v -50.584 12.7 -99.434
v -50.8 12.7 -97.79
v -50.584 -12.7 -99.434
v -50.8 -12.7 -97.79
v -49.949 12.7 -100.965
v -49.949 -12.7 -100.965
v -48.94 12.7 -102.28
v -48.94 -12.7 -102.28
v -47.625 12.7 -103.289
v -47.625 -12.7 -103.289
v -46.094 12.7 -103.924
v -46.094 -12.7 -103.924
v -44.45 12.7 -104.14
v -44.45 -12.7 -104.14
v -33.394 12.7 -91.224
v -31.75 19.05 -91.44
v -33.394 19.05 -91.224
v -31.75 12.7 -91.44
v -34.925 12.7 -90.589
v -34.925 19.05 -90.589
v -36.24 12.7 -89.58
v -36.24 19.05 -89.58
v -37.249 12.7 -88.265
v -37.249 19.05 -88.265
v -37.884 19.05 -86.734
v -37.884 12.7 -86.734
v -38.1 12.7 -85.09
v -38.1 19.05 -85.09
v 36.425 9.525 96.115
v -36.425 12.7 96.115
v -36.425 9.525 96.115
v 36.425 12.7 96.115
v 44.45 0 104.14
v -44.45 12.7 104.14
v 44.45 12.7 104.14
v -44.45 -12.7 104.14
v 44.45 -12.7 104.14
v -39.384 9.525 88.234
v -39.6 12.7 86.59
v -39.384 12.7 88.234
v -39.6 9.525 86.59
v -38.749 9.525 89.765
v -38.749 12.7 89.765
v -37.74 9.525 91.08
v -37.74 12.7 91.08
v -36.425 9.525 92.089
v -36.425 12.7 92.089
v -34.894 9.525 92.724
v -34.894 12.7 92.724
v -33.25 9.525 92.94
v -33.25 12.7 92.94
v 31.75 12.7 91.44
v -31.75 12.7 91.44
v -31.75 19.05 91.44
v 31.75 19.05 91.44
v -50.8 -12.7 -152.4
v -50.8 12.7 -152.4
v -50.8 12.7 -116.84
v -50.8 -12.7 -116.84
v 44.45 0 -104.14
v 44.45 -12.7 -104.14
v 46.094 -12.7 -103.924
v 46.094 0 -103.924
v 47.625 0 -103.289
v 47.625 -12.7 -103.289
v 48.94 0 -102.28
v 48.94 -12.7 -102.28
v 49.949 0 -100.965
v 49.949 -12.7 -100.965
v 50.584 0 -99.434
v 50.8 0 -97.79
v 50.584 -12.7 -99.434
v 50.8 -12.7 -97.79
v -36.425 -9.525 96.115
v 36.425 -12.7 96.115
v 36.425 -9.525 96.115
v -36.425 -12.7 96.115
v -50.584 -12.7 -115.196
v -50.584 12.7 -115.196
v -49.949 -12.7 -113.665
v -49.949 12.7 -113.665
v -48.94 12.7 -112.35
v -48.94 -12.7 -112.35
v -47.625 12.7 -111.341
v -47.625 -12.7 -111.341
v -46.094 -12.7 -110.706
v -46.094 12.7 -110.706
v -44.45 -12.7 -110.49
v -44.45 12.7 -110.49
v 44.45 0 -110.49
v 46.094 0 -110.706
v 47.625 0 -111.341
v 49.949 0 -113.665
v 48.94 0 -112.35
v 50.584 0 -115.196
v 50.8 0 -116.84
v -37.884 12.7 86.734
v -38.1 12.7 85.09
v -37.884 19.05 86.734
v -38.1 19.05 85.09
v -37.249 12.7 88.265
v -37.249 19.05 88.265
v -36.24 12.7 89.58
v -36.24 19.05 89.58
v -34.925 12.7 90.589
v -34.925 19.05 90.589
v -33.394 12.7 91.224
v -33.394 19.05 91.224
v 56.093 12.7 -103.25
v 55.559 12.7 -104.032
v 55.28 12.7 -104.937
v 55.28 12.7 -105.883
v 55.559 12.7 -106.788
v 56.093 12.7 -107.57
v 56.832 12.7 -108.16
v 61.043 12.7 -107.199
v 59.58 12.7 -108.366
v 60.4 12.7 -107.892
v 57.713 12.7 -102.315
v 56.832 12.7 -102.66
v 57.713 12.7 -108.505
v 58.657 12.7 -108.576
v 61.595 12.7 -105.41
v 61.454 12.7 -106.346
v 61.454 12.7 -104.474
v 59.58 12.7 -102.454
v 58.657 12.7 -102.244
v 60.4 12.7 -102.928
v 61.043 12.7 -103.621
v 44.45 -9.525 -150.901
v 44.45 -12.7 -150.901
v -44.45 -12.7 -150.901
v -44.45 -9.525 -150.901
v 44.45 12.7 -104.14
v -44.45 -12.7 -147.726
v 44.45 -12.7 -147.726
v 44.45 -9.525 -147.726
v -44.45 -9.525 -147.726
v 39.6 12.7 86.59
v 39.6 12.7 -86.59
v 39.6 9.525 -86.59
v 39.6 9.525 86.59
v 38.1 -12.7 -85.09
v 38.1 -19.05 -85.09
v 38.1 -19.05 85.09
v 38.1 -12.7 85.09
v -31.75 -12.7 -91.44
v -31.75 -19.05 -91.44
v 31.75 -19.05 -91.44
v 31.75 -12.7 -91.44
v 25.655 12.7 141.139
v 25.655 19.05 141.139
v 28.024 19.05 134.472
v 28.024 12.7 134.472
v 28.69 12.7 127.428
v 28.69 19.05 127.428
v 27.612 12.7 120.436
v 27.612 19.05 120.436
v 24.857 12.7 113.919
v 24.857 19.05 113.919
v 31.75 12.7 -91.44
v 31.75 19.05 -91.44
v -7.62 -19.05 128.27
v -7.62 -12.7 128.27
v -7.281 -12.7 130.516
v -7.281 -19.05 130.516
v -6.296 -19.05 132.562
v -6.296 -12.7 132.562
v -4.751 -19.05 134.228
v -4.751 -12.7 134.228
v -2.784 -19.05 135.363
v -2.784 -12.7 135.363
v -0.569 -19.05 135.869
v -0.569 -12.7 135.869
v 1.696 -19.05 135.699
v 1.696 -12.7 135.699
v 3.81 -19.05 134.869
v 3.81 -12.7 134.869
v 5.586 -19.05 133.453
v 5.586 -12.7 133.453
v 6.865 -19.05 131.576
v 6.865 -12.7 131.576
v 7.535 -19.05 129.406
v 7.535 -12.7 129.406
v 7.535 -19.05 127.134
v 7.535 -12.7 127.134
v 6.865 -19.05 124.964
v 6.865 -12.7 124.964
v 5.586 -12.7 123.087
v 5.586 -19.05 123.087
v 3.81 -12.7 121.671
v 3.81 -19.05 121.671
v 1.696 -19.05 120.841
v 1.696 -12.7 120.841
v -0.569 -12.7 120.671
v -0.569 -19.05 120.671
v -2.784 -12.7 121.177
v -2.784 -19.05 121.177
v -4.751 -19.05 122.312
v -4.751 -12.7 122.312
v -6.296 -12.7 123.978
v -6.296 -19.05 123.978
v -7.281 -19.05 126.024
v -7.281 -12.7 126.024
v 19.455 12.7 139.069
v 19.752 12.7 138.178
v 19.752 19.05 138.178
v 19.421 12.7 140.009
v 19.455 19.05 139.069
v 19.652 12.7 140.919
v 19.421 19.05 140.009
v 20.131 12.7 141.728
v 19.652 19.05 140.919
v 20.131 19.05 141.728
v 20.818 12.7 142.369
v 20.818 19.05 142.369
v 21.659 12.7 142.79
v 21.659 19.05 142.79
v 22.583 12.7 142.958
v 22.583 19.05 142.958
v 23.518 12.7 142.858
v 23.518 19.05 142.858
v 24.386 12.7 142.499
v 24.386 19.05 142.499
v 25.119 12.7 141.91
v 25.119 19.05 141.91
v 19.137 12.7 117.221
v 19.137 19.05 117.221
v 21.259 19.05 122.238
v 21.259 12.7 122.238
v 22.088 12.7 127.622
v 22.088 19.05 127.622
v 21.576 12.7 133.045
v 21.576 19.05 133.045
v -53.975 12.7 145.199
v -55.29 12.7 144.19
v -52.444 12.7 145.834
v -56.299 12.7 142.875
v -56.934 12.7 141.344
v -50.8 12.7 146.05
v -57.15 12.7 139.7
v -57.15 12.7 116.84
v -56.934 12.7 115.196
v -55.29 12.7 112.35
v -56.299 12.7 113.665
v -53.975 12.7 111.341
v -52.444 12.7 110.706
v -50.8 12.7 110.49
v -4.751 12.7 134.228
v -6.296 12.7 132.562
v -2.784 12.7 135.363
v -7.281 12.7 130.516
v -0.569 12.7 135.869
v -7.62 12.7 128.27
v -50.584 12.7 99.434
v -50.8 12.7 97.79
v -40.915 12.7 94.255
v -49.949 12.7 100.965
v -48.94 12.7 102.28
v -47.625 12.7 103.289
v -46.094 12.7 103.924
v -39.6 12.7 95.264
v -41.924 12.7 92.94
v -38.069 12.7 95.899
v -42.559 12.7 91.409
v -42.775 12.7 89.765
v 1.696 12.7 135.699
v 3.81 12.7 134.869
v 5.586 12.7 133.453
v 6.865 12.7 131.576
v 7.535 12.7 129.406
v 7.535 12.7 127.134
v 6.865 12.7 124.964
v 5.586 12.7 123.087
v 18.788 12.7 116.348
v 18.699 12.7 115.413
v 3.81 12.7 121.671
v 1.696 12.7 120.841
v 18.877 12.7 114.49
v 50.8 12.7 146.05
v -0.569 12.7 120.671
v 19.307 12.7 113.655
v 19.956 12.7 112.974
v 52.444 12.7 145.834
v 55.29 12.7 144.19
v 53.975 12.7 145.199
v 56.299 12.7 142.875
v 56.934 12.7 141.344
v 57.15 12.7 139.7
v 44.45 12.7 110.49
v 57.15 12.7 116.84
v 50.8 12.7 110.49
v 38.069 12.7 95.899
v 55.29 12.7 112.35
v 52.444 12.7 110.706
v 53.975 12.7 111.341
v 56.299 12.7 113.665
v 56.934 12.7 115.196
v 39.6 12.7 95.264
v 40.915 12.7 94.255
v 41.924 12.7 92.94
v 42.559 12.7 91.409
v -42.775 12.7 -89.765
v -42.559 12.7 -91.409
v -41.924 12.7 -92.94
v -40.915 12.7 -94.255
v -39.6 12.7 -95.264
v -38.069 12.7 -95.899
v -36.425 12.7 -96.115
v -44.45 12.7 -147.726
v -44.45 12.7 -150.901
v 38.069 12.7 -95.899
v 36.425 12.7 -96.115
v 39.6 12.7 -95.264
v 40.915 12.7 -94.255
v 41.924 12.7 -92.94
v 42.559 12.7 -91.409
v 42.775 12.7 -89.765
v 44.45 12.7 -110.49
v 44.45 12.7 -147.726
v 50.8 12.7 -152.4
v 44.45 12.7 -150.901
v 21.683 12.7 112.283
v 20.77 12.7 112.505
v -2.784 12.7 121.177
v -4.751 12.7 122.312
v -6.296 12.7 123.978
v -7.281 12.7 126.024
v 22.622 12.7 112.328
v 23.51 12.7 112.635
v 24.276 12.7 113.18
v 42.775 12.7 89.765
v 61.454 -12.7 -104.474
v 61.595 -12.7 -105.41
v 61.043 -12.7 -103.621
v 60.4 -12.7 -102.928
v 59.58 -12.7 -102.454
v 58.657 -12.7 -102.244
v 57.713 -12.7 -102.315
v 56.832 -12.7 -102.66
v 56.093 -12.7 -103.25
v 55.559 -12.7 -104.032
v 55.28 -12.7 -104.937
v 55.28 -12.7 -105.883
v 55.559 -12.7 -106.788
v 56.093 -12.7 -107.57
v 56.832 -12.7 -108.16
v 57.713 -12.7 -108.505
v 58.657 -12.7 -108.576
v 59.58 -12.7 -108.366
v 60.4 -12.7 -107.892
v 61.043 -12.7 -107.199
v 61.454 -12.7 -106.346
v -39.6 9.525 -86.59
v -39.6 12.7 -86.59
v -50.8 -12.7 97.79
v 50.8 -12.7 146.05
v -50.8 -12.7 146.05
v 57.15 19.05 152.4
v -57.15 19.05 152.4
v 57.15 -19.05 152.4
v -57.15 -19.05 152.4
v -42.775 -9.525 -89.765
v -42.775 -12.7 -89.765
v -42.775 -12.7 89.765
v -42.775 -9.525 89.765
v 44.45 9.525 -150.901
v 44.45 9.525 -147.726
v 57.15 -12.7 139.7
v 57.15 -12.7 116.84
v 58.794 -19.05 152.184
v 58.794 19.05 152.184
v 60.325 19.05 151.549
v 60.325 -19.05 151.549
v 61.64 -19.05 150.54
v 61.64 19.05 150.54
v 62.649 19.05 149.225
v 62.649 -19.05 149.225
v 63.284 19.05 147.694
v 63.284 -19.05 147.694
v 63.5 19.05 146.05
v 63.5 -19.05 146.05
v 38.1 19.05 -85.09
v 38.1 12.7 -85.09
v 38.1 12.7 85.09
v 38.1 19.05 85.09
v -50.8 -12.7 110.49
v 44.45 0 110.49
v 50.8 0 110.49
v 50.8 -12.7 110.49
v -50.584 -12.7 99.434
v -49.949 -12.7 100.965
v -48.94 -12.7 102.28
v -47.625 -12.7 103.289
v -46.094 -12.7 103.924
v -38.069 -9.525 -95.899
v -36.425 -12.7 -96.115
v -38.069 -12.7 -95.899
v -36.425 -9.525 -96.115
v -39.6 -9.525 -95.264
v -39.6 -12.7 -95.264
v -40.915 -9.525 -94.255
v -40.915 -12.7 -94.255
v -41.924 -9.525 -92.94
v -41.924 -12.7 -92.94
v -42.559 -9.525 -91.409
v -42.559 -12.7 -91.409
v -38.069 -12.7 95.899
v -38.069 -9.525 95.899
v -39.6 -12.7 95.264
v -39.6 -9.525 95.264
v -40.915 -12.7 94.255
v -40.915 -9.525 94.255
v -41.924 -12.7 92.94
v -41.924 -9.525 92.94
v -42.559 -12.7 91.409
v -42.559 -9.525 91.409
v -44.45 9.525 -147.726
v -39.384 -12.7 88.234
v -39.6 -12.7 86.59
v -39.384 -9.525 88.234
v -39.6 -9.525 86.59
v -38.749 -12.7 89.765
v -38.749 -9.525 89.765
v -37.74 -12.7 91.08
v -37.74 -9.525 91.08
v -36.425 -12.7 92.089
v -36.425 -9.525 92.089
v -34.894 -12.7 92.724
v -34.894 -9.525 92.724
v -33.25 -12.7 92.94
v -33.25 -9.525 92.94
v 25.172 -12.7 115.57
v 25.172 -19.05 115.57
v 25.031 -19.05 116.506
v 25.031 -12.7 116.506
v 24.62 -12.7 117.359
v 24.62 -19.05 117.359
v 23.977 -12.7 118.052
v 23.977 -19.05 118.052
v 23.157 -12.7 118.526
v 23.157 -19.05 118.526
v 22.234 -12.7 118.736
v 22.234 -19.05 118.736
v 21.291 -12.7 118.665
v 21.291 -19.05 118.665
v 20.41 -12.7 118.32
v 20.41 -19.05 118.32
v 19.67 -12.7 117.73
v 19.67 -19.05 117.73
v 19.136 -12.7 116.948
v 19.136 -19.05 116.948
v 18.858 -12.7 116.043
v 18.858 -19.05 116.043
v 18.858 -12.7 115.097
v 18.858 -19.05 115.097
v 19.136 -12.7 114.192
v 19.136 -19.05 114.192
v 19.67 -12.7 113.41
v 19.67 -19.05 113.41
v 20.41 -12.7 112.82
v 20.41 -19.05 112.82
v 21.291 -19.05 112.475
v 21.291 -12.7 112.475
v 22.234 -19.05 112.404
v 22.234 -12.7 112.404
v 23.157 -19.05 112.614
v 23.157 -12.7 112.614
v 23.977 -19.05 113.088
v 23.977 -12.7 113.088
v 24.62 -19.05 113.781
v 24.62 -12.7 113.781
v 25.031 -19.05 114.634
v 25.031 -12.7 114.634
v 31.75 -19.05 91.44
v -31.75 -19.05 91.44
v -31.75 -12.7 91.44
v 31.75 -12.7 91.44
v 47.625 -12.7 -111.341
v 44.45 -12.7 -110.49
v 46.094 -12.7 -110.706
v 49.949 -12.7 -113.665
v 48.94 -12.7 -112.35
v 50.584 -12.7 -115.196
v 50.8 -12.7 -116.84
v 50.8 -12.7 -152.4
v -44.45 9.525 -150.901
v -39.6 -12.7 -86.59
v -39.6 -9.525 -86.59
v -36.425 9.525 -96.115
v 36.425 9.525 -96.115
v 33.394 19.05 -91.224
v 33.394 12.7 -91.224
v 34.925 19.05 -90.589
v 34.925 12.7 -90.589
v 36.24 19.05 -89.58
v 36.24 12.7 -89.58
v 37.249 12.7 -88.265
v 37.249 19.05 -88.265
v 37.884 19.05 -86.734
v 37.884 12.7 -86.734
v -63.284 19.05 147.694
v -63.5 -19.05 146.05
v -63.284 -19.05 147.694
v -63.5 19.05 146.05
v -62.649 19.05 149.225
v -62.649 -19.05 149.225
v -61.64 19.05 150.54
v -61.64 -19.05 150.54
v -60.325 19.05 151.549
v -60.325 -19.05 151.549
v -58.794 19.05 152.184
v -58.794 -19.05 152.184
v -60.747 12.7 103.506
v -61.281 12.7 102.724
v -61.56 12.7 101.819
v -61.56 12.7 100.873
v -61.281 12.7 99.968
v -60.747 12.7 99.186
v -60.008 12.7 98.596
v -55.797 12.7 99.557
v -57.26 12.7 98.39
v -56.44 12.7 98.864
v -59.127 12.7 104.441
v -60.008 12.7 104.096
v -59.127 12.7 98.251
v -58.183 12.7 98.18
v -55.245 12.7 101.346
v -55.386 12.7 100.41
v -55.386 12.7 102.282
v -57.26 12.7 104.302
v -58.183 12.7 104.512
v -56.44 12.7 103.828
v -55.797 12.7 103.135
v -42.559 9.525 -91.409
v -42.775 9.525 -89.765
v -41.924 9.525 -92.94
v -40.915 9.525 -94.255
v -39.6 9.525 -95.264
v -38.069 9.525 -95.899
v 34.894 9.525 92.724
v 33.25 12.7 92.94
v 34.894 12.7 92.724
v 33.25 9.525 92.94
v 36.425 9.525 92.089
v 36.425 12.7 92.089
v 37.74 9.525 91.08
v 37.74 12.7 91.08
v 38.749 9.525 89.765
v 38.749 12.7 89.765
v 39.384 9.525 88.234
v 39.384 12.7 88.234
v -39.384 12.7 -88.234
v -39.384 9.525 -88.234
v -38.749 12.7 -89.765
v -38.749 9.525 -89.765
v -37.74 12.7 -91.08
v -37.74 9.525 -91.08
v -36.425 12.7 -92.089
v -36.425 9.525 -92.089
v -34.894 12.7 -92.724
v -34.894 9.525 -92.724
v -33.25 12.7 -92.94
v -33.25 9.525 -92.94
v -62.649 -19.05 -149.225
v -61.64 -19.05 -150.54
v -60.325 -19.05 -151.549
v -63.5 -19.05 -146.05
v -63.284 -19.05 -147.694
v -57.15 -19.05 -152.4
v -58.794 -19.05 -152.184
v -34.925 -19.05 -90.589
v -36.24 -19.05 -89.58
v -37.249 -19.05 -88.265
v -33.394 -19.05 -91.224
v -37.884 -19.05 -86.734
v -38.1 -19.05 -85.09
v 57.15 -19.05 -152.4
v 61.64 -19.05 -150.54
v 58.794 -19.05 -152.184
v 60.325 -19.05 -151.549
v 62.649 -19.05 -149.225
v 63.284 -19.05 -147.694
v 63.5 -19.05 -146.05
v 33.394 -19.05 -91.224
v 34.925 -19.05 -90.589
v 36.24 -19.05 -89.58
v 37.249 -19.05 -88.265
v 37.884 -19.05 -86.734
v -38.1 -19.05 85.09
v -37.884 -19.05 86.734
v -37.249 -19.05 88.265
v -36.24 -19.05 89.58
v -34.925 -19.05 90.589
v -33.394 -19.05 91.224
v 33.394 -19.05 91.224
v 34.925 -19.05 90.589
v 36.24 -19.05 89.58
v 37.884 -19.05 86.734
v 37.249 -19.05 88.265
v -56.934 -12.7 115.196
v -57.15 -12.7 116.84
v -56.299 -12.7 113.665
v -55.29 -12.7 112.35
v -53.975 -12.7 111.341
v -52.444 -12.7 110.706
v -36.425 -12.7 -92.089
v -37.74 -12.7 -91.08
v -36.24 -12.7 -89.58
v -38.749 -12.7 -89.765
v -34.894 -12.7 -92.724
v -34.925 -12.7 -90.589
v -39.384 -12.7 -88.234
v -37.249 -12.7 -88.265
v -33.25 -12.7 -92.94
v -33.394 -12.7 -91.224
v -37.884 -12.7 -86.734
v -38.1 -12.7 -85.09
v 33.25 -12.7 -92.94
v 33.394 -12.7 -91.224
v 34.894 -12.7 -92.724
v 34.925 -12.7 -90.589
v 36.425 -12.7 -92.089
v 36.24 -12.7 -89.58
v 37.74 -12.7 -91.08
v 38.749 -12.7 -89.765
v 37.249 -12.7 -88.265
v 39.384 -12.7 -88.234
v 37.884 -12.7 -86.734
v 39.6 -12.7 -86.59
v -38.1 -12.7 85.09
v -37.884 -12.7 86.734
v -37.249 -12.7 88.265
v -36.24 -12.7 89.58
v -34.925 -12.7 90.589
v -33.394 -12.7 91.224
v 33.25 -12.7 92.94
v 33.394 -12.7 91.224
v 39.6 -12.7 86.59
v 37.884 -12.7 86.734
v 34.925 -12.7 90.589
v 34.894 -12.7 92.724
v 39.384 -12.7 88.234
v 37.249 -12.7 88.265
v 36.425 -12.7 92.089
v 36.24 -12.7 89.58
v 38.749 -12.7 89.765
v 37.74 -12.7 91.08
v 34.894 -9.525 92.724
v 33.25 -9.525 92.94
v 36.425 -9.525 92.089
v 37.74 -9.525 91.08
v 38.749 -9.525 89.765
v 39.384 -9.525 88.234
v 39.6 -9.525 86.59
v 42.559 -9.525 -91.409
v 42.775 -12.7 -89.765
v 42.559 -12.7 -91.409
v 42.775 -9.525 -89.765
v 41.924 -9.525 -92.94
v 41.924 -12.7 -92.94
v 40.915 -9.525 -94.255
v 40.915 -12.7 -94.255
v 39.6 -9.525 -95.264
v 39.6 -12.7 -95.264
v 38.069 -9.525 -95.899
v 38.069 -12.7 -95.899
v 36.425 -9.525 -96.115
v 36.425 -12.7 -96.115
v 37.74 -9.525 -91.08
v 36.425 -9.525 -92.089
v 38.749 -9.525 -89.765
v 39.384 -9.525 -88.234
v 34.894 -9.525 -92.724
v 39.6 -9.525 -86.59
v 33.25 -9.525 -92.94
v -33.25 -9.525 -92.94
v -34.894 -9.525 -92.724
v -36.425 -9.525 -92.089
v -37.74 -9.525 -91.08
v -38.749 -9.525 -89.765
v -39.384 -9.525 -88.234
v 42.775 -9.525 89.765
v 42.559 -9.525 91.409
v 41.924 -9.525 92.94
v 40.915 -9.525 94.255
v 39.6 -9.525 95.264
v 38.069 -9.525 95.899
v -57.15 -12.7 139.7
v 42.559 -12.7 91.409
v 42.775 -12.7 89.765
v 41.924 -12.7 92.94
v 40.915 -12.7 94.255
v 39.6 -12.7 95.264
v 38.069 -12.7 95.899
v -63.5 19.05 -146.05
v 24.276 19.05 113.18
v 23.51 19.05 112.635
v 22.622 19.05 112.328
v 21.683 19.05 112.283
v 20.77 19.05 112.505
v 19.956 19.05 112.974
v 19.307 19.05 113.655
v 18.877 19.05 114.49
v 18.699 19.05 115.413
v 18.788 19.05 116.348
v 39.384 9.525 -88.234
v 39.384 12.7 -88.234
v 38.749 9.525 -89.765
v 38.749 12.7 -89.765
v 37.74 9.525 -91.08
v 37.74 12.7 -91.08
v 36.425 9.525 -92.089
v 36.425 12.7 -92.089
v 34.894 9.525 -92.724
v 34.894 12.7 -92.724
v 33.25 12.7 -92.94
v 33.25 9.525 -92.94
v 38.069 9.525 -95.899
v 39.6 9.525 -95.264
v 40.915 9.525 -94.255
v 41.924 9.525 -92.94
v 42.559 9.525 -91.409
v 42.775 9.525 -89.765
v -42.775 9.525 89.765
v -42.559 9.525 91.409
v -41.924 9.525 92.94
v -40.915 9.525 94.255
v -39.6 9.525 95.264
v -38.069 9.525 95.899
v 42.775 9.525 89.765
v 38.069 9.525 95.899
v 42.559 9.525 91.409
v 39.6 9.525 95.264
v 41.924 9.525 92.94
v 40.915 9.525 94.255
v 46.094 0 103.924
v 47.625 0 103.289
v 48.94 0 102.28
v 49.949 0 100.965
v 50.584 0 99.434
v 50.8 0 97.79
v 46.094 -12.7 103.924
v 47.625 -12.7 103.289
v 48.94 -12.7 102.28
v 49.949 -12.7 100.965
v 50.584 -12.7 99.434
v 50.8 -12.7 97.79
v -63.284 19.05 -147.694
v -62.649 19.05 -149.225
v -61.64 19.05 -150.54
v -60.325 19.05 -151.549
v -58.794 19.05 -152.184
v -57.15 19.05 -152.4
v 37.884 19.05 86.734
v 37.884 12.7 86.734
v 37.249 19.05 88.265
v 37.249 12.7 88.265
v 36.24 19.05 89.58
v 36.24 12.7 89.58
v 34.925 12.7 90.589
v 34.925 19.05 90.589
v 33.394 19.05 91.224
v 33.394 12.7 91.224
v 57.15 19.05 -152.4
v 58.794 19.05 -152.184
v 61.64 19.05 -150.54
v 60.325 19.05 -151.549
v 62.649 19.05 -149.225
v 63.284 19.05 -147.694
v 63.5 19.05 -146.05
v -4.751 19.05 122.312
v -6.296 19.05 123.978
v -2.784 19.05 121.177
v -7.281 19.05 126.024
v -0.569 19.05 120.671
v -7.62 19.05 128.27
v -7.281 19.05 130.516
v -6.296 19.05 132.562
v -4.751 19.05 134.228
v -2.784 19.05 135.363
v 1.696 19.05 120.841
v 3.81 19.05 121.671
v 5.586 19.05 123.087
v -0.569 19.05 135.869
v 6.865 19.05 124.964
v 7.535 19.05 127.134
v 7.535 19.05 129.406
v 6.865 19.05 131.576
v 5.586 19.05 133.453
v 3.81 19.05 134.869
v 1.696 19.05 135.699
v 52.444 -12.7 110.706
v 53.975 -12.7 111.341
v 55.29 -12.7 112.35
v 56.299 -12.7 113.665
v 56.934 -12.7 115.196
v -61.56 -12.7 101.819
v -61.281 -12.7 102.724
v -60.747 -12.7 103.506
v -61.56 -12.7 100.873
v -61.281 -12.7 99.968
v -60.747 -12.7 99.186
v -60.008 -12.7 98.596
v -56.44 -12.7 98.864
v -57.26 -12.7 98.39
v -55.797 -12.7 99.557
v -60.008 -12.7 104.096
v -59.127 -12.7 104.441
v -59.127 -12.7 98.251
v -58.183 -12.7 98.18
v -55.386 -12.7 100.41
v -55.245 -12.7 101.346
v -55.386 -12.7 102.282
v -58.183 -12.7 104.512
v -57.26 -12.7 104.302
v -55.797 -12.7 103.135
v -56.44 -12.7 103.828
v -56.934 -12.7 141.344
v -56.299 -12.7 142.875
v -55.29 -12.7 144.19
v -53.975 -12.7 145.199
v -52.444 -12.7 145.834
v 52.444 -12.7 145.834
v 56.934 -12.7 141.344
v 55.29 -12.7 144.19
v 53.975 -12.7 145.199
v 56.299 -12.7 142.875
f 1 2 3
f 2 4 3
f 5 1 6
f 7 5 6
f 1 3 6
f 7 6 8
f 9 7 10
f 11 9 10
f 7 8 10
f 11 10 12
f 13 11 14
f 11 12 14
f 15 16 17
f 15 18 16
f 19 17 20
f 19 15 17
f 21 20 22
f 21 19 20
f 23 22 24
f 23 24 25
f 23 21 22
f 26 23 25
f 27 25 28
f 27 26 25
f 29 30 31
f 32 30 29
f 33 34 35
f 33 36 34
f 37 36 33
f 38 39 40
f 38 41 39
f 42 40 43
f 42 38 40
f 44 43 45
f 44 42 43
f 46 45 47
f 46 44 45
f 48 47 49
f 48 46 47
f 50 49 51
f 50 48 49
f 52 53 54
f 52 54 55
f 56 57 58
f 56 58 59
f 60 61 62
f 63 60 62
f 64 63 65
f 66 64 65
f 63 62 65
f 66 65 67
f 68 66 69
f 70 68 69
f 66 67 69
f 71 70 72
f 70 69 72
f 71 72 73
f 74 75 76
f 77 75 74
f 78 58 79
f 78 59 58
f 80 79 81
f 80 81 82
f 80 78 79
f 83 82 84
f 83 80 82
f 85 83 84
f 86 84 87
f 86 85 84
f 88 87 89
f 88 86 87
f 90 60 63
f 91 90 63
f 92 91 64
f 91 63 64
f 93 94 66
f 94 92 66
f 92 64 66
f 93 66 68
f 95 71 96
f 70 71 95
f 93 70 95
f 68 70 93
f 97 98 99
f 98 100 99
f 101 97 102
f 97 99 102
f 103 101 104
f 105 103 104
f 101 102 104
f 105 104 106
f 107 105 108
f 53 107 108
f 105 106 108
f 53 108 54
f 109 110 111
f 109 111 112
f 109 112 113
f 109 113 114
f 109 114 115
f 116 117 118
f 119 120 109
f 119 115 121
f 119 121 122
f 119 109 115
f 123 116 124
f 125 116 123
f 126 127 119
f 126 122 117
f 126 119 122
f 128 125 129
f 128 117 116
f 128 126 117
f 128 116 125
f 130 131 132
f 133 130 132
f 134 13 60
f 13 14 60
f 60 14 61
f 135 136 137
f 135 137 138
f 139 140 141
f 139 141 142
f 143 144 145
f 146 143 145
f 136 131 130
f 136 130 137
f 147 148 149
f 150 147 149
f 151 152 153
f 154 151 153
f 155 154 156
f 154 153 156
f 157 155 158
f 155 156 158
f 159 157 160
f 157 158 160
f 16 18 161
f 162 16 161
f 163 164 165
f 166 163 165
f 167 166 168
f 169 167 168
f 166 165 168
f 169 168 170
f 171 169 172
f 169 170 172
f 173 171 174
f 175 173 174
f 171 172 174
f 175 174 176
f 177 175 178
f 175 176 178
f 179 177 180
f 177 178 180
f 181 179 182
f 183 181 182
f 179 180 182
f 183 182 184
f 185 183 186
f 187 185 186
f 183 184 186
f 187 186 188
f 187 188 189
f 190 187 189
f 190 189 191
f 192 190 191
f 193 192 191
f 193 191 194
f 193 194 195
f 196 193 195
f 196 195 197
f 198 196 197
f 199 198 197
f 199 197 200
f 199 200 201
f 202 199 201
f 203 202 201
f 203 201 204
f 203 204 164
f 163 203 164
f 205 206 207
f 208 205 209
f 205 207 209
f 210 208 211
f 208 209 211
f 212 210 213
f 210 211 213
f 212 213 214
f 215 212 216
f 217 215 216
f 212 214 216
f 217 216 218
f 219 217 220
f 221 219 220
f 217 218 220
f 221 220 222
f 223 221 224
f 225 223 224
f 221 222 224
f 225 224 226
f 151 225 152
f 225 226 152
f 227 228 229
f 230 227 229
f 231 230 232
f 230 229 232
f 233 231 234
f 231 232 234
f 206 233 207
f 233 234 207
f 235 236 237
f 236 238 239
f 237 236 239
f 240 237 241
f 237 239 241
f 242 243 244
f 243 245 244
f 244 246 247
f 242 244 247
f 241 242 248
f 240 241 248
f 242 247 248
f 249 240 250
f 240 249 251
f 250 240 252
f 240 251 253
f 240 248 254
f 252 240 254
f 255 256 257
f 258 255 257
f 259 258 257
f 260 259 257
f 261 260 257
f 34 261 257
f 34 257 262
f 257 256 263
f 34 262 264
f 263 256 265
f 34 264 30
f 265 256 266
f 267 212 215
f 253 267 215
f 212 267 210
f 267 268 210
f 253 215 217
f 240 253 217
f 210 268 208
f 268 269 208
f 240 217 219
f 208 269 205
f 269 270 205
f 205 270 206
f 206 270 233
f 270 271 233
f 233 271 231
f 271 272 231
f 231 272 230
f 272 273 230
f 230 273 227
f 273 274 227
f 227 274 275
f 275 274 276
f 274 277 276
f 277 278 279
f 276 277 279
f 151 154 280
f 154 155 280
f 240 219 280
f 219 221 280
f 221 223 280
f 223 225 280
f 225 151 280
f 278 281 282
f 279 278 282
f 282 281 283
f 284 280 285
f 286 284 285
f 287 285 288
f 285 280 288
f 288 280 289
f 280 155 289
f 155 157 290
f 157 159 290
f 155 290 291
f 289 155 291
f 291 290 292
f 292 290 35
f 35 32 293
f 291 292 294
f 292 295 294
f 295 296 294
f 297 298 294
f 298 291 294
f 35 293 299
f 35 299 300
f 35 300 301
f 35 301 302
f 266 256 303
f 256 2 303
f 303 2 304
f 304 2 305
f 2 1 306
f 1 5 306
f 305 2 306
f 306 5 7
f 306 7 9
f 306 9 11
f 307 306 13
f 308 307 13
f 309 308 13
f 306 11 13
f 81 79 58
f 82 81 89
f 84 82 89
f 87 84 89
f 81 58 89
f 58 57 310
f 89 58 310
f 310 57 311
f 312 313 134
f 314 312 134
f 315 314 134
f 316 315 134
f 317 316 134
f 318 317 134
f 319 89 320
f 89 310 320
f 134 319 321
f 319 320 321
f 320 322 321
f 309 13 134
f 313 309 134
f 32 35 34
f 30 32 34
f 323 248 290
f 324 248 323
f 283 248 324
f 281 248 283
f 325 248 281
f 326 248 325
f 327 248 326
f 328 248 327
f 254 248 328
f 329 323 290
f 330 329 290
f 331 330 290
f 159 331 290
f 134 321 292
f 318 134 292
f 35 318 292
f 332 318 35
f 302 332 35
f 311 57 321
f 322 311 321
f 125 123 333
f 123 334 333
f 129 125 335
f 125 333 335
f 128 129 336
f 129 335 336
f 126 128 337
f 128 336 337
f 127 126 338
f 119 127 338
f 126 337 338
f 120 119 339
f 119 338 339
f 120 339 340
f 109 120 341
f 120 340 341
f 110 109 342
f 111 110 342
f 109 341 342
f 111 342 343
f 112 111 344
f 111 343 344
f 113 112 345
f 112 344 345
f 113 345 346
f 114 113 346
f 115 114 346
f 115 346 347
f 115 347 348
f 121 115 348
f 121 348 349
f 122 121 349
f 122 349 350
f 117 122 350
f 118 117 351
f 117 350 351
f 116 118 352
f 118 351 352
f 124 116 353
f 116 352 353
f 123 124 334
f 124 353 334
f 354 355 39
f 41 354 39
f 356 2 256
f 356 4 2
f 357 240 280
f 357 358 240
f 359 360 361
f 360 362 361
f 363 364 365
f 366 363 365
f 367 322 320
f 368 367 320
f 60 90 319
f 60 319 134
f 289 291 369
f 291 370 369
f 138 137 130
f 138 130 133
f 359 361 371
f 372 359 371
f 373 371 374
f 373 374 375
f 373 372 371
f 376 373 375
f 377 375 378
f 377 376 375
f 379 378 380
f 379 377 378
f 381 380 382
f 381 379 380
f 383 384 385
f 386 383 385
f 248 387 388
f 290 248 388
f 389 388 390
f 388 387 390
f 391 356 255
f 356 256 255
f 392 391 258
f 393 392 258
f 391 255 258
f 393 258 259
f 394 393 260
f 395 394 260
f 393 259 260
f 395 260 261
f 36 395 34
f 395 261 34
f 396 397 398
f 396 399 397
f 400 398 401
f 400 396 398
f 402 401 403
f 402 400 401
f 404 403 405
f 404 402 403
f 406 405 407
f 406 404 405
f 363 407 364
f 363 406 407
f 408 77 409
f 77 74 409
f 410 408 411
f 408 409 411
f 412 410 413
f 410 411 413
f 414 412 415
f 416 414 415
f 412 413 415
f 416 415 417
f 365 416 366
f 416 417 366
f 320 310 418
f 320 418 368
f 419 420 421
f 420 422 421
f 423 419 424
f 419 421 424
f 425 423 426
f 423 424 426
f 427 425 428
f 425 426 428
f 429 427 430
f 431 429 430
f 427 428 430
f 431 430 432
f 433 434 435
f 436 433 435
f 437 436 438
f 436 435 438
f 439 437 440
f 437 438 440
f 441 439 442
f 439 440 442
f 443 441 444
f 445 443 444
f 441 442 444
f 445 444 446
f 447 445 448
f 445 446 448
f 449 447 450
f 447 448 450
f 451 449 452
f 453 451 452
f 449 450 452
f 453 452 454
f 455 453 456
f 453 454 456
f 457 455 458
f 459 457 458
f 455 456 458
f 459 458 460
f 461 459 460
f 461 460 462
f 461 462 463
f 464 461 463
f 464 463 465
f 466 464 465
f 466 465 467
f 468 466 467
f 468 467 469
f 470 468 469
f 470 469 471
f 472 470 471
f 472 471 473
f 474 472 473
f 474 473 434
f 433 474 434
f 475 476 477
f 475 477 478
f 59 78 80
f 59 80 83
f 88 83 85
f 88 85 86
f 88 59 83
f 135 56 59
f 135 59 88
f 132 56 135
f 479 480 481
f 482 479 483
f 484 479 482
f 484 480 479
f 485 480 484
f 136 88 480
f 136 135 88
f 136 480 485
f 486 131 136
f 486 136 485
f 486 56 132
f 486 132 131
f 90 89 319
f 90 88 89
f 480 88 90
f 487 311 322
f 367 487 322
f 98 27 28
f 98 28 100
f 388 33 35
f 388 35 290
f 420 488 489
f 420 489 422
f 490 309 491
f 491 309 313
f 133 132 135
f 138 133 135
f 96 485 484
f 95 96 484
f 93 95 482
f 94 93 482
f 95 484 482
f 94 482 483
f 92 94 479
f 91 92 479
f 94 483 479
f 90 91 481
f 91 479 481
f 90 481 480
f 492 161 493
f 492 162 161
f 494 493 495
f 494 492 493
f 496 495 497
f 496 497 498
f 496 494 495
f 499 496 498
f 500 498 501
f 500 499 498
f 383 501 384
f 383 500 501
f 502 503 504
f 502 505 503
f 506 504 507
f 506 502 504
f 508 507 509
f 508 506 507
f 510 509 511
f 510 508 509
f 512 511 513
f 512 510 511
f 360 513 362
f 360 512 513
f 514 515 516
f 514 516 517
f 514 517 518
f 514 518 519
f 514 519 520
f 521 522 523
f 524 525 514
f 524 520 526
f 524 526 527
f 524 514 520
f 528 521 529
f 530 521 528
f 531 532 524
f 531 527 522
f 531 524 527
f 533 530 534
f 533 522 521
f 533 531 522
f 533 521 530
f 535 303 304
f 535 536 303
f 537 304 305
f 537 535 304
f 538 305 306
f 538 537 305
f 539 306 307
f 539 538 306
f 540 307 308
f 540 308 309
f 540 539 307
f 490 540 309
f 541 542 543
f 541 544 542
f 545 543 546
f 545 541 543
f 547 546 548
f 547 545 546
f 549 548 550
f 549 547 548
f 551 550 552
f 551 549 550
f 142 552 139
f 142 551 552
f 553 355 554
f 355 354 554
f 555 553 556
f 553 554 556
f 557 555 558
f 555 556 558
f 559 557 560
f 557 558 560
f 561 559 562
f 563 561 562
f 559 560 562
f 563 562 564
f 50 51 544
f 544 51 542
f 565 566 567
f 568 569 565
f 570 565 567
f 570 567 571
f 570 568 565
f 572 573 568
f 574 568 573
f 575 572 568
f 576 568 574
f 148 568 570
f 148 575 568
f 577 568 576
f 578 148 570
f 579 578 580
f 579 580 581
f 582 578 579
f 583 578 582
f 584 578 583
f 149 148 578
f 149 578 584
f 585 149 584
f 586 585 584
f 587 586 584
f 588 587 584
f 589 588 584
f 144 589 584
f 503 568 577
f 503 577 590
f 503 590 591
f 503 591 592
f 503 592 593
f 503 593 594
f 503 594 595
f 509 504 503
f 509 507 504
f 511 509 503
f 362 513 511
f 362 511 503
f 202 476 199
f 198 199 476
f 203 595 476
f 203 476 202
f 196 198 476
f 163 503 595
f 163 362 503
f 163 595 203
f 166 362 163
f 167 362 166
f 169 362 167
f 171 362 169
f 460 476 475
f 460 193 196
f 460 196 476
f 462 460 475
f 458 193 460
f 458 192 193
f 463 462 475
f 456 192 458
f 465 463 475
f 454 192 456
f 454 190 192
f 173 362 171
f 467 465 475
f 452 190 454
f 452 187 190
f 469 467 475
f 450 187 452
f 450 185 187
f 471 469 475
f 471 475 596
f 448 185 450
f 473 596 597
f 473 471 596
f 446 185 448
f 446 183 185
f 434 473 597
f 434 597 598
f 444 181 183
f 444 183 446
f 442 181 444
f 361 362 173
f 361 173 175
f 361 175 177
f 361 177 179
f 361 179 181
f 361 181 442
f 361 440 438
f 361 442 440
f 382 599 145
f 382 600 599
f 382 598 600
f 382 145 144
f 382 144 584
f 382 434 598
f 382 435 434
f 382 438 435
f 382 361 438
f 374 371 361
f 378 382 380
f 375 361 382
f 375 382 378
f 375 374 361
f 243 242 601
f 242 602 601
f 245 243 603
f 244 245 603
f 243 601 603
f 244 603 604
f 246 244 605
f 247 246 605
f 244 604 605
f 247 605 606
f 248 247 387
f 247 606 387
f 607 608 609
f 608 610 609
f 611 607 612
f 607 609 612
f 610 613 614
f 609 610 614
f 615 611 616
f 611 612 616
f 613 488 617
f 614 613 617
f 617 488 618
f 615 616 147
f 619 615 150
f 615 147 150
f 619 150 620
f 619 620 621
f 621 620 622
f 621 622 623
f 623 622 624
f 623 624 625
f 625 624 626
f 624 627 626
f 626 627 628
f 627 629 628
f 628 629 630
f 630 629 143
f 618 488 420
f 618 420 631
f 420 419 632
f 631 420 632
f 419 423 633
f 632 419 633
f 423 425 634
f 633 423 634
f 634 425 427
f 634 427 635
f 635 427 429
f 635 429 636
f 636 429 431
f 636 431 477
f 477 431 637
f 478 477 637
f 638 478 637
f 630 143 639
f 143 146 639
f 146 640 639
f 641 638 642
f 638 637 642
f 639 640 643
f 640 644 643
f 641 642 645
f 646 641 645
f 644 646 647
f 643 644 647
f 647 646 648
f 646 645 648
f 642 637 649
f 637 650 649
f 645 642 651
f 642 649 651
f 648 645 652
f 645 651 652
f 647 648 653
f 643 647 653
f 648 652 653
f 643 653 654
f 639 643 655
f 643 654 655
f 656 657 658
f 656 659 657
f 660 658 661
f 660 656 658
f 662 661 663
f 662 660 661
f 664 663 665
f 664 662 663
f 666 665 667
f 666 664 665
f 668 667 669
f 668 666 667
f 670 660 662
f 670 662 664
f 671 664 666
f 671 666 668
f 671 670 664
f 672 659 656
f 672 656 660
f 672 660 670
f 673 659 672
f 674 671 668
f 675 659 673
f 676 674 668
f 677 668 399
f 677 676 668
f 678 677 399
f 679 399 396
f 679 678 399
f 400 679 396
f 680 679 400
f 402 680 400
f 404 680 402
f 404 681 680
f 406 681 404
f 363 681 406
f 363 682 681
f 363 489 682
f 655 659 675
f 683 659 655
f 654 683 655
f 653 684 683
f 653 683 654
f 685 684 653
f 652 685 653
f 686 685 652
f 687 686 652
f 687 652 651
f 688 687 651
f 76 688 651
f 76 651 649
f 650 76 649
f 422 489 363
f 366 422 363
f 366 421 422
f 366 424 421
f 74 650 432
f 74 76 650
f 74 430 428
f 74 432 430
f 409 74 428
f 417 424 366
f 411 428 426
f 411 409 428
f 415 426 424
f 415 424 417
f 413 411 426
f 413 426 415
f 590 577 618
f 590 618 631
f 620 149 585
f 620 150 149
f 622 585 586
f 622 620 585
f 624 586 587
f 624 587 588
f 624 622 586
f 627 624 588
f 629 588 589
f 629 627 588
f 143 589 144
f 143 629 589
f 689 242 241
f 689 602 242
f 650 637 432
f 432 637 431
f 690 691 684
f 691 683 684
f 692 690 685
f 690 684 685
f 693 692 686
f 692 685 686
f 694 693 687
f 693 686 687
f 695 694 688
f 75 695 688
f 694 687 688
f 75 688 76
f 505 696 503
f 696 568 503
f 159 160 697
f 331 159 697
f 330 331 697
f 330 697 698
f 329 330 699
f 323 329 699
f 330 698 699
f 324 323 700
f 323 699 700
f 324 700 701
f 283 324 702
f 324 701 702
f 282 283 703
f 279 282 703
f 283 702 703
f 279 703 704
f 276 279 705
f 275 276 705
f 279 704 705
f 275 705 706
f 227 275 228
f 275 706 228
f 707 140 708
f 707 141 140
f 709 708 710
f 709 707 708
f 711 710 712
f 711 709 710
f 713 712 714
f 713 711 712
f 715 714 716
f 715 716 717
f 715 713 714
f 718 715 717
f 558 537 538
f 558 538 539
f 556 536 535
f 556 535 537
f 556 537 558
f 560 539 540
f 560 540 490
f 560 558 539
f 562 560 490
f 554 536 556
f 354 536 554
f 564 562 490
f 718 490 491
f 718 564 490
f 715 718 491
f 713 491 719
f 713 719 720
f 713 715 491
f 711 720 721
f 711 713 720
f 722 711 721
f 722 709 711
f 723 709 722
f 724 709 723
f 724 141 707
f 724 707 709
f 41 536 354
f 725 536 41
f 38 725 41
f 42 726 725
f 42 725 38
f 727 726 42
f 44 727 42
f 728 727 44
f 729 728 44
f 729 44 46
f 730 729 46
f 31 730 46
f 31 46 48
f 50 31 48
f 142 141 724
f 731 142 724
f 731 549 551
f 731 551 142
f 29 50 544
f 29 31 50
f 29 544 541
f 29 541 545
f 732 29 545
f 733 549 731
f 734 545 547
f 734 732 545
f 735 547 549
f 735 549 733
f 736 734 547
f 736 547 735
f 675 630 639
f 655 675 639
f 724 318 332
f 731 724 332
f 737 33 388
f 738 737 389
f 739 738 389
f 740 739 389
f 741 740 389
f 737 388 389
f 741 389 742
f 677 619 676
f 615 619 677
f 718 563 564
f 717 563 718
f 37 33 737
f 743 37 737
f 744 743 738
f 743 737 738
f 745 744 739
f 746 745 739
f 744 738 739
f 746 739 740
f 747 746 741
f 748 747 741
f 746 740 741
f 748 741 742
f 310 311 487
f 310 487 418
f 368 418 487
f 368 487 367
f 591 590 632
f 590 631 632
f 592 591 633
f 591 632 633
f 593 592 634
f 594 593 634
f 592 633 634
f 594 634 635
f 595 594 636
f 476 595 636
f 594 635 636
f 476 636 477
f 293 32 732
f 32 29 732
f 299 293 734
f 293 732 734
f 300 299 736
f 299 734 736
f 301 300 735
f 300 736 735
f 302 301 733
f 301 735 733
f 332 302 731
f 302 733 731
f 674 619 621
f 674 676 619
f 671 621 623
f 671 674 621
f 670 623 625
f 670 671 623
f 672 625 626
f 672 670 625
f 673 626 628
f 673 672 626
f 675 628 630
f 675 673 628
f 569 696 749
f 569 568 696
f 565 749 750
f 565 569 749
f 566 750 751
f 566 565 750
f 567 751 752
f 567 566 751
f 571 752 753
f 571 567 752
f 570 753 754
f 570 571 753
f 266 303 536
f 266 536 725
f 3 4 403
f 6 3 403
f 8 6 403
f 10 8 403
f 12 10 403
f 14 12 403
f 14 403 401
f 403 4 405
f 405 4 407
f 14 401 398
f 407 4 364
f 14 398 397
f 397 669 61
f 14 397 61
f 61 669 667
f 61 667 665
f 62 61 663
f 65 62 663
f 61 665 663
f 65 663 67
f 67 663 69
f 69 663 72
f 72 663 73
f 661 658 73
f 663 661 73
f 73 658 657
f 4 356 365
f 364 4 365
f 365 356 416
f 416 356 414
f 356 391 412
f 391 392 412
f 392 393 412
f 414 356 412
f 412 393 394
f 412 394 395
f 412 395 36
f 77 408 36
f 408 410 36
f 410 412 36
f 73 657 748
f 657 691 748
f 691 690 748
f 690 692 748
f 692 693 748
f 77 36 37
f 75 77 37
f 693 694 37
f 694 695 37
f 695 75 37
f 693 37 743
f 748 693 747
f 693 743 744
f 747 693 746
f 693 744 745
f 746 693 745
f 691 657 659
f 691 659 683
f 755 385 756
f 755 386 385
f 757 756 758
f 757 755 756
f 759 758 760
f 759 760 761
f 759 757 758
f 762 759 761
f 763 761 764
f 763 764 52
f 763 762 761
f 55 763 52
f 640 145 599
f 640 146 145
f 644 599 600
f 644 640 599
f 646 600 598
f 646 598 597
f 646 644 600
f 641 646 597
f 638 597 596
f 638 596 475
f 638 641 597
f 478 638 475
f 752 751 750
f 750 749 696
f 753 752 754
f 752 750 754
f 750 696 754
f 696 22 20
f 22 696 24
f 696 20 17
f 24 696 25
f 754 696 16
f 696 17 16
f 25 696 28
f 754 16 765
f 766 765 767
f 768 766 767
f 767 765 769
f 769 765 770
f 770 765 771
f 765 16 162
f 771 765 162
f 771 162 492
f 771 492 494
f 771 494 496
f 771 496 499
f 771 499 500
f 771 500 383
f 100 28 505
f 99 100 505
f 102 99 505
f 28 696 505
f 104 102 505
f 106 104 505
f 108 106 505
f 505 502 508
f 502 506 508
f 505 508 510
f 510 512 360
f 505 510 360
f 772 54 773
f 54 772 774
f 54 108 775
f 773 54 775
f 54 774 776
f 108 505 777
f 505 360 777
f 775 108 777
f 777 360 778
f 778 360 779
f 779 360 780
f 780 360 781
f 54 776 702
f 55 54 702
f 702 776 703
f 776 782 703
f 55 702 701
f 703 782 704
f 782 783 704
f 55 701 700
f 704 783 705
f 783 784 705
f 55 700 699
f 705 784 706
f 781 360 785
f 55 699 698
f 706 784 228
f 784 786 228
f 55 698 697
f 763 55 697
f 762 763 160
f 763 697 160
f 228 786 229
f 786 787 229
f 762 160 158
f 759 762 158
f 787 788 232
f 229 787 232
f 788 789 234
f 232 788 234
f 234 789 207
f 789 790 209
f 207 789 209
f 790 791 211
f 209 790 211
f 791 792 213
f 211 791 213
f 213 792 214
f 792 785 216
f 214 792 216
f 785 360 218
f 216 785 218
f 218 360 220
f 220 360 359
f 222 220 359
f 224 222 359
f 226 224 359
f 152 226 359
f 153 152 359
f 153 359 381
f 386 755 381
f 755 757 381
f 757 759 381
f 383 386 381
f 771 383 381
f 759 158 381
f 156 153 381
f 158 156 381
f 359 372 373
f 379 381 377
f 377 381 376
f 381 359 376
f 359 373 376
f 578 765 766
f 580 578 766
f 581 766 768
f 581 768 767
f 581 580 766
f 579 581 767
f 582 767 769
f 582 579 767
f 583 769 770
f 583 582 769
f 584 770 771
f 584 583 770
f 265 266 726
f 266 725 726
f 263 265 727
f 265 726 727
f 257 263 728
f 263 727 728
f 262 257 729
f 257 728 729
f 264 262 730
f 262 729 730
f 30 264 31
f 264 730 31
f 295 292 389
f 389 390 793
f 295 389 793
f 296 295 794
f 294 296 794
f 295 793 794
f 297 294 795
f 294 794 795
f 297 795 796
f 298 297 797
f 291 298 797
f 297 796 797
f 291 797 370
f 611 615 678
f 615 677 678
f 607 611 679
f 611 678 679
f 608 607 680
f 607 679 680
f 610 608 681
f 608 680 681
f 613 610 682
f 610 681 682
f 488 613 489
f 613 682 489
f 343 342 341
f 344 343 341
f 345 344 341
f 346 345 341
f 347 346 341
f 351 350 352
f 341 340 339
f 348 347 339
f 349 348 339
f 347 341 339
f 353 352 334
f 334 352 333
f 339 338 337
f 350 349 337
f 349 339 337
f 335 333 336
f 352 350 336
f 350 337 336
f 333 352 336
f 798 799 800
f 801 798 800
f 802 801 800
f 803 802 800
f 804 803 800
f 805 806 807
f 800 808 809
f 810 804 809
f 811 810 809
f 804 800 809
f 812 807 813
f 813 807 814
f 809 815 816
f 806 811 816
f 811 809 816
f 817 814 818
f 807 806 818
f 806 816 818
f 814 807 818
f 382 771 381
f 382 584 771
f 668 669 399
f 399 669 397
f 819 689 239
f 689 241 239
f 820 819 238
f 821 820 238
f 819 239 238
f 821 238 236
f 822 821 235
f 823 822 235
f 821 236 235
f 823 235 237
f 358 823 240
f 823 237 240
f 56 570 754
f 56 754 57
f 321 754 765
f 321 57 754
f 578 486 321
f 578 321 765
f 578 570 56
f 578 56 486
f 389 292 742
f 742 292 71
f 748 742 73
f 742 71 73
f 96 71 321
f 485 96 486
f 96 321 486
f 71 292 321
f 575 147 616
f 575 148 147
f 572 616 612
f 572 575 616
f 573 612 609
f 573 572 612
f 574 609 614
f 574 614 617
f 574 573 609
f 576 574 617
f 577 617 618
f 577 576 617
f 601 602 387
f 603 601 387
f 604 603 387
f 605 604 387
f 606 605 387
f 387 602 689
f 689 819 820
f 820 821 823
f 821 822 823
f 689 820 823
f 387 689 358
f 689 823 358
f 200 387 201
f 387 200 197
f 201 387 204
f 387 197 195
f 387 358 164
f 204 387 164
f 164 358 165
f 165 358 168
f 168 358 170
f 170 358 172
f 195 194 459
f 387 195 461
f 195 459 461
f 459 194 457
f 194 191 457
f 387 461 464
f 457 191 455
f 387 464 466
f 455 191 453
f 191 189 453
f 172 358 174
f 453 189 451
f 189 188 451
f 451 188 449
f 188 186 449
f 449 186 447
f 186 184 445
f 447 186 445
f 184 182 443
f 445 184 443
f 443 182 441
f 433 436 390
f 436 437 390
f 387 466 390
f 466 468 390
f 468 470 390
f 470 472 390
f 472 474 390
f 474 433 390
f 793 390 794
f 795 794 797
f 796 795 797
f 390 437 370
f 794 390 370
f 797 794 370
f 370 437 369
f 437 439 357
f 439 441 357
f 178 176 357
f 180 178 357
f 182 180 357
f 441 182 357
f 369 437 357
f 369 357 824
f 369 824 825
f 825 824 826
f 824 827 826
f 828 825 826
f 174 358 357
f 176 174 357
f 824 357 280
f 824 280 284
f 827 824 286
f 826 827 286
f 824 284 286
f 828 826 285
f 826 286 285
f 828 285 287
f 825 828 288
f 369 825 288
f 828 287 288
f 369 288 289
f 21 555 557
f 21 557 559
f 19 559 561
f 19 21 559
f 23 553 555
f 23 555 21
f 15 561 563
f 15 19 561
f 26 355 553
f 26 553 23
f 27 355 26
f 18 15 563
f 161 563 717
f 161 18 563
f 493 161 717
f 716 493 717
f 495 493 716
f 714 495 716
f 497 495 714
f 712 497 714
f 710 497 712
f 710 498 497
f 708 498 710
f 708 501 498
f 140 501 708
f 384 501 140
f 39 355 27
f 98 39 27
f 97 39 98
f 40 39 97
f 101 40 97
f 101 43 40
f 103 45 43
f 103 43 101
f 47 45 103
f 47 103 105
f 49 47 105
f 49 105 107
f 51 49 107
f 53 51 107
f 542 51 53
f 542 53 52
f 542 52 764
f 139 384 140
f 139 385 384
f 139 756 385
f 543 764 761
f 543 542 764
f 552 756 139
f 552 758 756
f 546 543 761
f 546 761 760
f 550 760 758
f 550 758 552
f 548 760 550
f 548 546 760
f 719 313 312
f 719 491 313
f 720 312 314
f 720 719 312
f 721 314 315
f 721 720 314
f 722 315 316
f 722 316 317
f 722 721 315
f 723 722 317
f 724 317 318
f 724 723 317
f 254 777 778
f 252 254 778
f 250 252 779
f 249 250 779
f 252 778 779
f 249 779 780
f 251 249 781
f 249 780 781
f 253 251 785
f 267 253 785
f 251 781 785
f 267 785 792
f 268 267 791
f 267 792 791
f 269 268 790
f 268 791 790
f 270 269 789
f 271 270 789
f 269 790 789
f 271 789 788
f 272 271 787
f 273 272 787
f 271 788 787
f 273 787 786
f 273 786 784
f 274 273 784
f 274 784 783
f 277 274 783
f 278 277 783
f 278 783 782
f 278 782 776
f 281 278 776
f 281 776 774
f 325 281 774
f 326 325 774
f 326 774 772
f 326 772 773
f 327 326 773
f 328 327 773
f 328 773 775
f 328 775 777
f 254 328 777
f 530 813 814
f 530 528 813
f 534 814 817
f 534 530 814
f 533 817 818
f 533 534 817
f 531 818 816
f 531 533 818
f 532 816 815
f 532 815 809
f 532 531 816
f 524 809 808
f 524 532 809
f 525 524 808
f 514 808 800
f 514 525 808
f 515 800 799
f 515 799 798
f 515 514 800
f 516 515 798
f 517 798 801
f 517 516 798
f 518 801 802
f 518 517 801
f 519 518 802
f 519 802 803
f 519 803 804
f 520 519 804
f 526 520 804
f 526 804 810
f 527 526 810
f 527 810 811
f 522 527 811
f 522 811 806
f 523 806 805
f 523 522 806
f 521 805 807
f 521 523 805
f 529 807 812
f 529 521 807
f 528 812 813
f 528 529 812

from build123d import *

# Parameters (mm, degrees)
F0_W      = 127
F0_H      = 304.8
F0_W_2    = 76.2
F0_H_2    = 182.88
F1_DEPTH  = 19.05
F2_W      = 101.6
F2_H      = 25.4
F3_DEPTH  = 41.91
F4_W      = 101.6
F4_H      = 208.28
F5_DEPTH  = 12.7
F6_W      = 114.3
F6_H      = 35.56
F7_DEPTH  = 12.7
F8_W      = 85.55
F8_H      = 192.23
F8_W_2    = 79.2
F8_H_2    = 185.88
F8_W_3    = 88.9
F8_H_3    = 3.175
F9_DEPTH  = 3.175
F10_W     = 85.55
F10_H     = 192.23
F10_W_2   = 79.2
F10_H_2   = 185.88
F10_W_3   = 88.9
F10_H_3   = 3.175
F11_DEPTH = 3.175
F13_D     = 15.24
F14_R     = 6.35
F15_W     = 6.35
F15_H     = 242.316
F16_DEPTH = 12.7
F18_DEPTH = 25.4
F19_R     = 3.175
F20_DEPTH = 12.7
F21_R     = 3.175
F22_DEPTH = 12.7


with BuildPart() as f1:
    # F0 (on Front) → F1 (new body, symmetric)
    with BuildSketch(Plane.XZ):
        Rectangle(F0_W, F0_H)
        Rectangle(F0_W_2, F0_H_2, mode=Mode.SUBTRACT)
    extrude(amount=F1_DEPTH, both=True)

    # F2 (on face) → F3 (cut)
    with BuildSketch(Plane(origin=(0, 0, -152.4), x_dir=(1, 0, 0), z_dir=(0, 0, -1))):
        Rectangle(F2_W, F2_H)
    extrude(amount=-F3_DEPTH, mode=Mode.SUBTRACT)

    # F4 (on Front) → F5 (cut, symmetric)
    with BuildSketch(Plane.XZ):
        Rectangle(F4_W, F4_H)
    extrude(amount=F5_DEPTH, both=True, mode=Mode.SUBTRACT)

    # F6 (on Front) → F7 (cut, symmetric)
    with BuildSketch(Plane.XZ):
        with Locations((0, 128.27)):
            Rectangle(F6_W, F6_H)
    extrude(amount=F7_DEPTH, both=True, mode=Mode.SUBTRACT)

    # F8 (on face) → F9 (join)
    with BuildSketch(Plane.XZ.offset(-12.7)):
        Rectangle(F8_W, F8_H)
        Rectangle(F8_W_2, F8_H_2, mode=Mode.SUBTRACT)
        with Locations((0, -149.3139)):
            Rectangle(F8_W_3, F8_H_3)
    extrude(amount=F9_DEPTH)

    # F10 (on face) → F11 (join)
    with BuildSketch(Plane(origin=(0, -12.7, 0), x_dir=(-1, 0, 0), z_dir=(0, 1, 0))):
        Rectangle(F10_W, F10_H)
        Rectangle(F10_W_2, F10_H_2, mode=Mode.SUBTRACT)
        with Locations((0, -149.3139)):
            Rectangle(F10_W_3, F10_H_3)
    extrude(amount=F11_DEPTH)

    # F13 (through all)
    with Locations(Plane.XZ.offset(19.05)):
        with Locations((0, 128.27)):
            Hole(F13_D / 2)

    # F14
    f14_edges = [f1.edges().sort_by_distance(p)[0] for p in [
        (-57.15, 0, 146.05),
        (-57.15, 0, 110.49),
        (57.15, 0, 110.49),
        (57.15, 0, 146.05),
        (-50.8, 0, 104.14),
        (50.8, 0, 104.14),
        (-50.8, 0, -110.49),
        (-50.8, 0, -104.14),
        (50.8, 0, -110.49),
        (50.8, 0, -104.14),
        (-42.775, -11.1125, 96.115),
        (-38.1, 15.875, 91.44),
        (-38.1, -15.875, 91.44),
        (-39.6, -11.1125, 92.94),
        (38.1, 15.875, 91.44),
        (38.1, -15.875, 91.44),
        (42.775, -11.1125, 96.115),
        (39.6, -11.1125, 92.94),
        (-39.6, 11.1125, 92.94),
        (-42.775, 11.1125, 96.115),
        (42.775, 11.1125, 96.115),
        (39.6, 11.1125, 92.94),
        (38.1, 15.875, -91.44),
        (38.1, -15.875, -91.44),
        (39.6, 11.1125, -92.94),
        (42.775, 11.1125, -96.115),
        (42.775, -11.1125, -96.115),
        (39.6, -11.1125, -92.94),
        (-39.6, 11.1125, -92.94),
        (-38.1, 15.875, -91.44),
        (-38.1, -15.875, -91.44),
        (-42.775, 11.1125, -96.115),
        (-39.6, -11.1125, -92.94),
        (-42.775, -11.1125, -96.115),
        (-63.5, 0, 152.4),
        (63.5, 0, 152.4),
        (-63.5, 0, -152.4),
        (63.5, 0, -152.4),
    ]]
    fillet(f14_edges, radius=F14_R)

    # F15 (on Front) → F16 (cut)
    with BuildSketch(Plane.XZ):
        with Locations((47.625, -4.318)):
            Rectangle(F15_W, F15_H)
    extrude(amount=-F16_DEPTH, mode=Mode.SUBTRACT)

    # F17 (on face) → F18 (cut)
    with BuildSketch(Plane(origin=(0, 19.05, 0), x_dir=(-1, 0, 0), z_dir=(0, 1, 0))):
        with BuildLine():
            ThreePointArc((-19.752405, 138.177781), (-21.22344, 142.609762), (-25.655422, 141.138727))
            ThreePointArc((-25.655422, 141.138727), (-28.68965, 127.428104), (-24.856661, 113.919))
            ThreePointArc((-24.856661, 113.919), (-20.346045, 112.710384), (-19.137429, 117.221))
            ThreePointArc((-19.137429, 117.221), (-22.088492, 127.621815), (-19.752405, 138.177781))
        make_face()
    extrude(amount=-F18_DEPTH, mode=Mode.SUBTRACT)

    # F19 (on face) → F20 (cut)
    with BuildSketch(Plane.XZ.offset(19.05)):
        with Locations((21.997045, 115.57)):
            Circle(F19_R)
    extrude(amount=-F20_DEPTH, mode=Mode.SUBTRACT)

    # F21 (on Front) → F22 (cut, symmetric)
    with BuildSketch(Plane.XZ):
        with Locations((-58.42, 101.346)):
            Circle(F21_R)
        with Locations((58.42, -105.41)):
            Circle(F21_R)
    extrude(amount=F22_DEPTH, both=True, mode=Mode.SUBTRACT)


solid = f1.part
